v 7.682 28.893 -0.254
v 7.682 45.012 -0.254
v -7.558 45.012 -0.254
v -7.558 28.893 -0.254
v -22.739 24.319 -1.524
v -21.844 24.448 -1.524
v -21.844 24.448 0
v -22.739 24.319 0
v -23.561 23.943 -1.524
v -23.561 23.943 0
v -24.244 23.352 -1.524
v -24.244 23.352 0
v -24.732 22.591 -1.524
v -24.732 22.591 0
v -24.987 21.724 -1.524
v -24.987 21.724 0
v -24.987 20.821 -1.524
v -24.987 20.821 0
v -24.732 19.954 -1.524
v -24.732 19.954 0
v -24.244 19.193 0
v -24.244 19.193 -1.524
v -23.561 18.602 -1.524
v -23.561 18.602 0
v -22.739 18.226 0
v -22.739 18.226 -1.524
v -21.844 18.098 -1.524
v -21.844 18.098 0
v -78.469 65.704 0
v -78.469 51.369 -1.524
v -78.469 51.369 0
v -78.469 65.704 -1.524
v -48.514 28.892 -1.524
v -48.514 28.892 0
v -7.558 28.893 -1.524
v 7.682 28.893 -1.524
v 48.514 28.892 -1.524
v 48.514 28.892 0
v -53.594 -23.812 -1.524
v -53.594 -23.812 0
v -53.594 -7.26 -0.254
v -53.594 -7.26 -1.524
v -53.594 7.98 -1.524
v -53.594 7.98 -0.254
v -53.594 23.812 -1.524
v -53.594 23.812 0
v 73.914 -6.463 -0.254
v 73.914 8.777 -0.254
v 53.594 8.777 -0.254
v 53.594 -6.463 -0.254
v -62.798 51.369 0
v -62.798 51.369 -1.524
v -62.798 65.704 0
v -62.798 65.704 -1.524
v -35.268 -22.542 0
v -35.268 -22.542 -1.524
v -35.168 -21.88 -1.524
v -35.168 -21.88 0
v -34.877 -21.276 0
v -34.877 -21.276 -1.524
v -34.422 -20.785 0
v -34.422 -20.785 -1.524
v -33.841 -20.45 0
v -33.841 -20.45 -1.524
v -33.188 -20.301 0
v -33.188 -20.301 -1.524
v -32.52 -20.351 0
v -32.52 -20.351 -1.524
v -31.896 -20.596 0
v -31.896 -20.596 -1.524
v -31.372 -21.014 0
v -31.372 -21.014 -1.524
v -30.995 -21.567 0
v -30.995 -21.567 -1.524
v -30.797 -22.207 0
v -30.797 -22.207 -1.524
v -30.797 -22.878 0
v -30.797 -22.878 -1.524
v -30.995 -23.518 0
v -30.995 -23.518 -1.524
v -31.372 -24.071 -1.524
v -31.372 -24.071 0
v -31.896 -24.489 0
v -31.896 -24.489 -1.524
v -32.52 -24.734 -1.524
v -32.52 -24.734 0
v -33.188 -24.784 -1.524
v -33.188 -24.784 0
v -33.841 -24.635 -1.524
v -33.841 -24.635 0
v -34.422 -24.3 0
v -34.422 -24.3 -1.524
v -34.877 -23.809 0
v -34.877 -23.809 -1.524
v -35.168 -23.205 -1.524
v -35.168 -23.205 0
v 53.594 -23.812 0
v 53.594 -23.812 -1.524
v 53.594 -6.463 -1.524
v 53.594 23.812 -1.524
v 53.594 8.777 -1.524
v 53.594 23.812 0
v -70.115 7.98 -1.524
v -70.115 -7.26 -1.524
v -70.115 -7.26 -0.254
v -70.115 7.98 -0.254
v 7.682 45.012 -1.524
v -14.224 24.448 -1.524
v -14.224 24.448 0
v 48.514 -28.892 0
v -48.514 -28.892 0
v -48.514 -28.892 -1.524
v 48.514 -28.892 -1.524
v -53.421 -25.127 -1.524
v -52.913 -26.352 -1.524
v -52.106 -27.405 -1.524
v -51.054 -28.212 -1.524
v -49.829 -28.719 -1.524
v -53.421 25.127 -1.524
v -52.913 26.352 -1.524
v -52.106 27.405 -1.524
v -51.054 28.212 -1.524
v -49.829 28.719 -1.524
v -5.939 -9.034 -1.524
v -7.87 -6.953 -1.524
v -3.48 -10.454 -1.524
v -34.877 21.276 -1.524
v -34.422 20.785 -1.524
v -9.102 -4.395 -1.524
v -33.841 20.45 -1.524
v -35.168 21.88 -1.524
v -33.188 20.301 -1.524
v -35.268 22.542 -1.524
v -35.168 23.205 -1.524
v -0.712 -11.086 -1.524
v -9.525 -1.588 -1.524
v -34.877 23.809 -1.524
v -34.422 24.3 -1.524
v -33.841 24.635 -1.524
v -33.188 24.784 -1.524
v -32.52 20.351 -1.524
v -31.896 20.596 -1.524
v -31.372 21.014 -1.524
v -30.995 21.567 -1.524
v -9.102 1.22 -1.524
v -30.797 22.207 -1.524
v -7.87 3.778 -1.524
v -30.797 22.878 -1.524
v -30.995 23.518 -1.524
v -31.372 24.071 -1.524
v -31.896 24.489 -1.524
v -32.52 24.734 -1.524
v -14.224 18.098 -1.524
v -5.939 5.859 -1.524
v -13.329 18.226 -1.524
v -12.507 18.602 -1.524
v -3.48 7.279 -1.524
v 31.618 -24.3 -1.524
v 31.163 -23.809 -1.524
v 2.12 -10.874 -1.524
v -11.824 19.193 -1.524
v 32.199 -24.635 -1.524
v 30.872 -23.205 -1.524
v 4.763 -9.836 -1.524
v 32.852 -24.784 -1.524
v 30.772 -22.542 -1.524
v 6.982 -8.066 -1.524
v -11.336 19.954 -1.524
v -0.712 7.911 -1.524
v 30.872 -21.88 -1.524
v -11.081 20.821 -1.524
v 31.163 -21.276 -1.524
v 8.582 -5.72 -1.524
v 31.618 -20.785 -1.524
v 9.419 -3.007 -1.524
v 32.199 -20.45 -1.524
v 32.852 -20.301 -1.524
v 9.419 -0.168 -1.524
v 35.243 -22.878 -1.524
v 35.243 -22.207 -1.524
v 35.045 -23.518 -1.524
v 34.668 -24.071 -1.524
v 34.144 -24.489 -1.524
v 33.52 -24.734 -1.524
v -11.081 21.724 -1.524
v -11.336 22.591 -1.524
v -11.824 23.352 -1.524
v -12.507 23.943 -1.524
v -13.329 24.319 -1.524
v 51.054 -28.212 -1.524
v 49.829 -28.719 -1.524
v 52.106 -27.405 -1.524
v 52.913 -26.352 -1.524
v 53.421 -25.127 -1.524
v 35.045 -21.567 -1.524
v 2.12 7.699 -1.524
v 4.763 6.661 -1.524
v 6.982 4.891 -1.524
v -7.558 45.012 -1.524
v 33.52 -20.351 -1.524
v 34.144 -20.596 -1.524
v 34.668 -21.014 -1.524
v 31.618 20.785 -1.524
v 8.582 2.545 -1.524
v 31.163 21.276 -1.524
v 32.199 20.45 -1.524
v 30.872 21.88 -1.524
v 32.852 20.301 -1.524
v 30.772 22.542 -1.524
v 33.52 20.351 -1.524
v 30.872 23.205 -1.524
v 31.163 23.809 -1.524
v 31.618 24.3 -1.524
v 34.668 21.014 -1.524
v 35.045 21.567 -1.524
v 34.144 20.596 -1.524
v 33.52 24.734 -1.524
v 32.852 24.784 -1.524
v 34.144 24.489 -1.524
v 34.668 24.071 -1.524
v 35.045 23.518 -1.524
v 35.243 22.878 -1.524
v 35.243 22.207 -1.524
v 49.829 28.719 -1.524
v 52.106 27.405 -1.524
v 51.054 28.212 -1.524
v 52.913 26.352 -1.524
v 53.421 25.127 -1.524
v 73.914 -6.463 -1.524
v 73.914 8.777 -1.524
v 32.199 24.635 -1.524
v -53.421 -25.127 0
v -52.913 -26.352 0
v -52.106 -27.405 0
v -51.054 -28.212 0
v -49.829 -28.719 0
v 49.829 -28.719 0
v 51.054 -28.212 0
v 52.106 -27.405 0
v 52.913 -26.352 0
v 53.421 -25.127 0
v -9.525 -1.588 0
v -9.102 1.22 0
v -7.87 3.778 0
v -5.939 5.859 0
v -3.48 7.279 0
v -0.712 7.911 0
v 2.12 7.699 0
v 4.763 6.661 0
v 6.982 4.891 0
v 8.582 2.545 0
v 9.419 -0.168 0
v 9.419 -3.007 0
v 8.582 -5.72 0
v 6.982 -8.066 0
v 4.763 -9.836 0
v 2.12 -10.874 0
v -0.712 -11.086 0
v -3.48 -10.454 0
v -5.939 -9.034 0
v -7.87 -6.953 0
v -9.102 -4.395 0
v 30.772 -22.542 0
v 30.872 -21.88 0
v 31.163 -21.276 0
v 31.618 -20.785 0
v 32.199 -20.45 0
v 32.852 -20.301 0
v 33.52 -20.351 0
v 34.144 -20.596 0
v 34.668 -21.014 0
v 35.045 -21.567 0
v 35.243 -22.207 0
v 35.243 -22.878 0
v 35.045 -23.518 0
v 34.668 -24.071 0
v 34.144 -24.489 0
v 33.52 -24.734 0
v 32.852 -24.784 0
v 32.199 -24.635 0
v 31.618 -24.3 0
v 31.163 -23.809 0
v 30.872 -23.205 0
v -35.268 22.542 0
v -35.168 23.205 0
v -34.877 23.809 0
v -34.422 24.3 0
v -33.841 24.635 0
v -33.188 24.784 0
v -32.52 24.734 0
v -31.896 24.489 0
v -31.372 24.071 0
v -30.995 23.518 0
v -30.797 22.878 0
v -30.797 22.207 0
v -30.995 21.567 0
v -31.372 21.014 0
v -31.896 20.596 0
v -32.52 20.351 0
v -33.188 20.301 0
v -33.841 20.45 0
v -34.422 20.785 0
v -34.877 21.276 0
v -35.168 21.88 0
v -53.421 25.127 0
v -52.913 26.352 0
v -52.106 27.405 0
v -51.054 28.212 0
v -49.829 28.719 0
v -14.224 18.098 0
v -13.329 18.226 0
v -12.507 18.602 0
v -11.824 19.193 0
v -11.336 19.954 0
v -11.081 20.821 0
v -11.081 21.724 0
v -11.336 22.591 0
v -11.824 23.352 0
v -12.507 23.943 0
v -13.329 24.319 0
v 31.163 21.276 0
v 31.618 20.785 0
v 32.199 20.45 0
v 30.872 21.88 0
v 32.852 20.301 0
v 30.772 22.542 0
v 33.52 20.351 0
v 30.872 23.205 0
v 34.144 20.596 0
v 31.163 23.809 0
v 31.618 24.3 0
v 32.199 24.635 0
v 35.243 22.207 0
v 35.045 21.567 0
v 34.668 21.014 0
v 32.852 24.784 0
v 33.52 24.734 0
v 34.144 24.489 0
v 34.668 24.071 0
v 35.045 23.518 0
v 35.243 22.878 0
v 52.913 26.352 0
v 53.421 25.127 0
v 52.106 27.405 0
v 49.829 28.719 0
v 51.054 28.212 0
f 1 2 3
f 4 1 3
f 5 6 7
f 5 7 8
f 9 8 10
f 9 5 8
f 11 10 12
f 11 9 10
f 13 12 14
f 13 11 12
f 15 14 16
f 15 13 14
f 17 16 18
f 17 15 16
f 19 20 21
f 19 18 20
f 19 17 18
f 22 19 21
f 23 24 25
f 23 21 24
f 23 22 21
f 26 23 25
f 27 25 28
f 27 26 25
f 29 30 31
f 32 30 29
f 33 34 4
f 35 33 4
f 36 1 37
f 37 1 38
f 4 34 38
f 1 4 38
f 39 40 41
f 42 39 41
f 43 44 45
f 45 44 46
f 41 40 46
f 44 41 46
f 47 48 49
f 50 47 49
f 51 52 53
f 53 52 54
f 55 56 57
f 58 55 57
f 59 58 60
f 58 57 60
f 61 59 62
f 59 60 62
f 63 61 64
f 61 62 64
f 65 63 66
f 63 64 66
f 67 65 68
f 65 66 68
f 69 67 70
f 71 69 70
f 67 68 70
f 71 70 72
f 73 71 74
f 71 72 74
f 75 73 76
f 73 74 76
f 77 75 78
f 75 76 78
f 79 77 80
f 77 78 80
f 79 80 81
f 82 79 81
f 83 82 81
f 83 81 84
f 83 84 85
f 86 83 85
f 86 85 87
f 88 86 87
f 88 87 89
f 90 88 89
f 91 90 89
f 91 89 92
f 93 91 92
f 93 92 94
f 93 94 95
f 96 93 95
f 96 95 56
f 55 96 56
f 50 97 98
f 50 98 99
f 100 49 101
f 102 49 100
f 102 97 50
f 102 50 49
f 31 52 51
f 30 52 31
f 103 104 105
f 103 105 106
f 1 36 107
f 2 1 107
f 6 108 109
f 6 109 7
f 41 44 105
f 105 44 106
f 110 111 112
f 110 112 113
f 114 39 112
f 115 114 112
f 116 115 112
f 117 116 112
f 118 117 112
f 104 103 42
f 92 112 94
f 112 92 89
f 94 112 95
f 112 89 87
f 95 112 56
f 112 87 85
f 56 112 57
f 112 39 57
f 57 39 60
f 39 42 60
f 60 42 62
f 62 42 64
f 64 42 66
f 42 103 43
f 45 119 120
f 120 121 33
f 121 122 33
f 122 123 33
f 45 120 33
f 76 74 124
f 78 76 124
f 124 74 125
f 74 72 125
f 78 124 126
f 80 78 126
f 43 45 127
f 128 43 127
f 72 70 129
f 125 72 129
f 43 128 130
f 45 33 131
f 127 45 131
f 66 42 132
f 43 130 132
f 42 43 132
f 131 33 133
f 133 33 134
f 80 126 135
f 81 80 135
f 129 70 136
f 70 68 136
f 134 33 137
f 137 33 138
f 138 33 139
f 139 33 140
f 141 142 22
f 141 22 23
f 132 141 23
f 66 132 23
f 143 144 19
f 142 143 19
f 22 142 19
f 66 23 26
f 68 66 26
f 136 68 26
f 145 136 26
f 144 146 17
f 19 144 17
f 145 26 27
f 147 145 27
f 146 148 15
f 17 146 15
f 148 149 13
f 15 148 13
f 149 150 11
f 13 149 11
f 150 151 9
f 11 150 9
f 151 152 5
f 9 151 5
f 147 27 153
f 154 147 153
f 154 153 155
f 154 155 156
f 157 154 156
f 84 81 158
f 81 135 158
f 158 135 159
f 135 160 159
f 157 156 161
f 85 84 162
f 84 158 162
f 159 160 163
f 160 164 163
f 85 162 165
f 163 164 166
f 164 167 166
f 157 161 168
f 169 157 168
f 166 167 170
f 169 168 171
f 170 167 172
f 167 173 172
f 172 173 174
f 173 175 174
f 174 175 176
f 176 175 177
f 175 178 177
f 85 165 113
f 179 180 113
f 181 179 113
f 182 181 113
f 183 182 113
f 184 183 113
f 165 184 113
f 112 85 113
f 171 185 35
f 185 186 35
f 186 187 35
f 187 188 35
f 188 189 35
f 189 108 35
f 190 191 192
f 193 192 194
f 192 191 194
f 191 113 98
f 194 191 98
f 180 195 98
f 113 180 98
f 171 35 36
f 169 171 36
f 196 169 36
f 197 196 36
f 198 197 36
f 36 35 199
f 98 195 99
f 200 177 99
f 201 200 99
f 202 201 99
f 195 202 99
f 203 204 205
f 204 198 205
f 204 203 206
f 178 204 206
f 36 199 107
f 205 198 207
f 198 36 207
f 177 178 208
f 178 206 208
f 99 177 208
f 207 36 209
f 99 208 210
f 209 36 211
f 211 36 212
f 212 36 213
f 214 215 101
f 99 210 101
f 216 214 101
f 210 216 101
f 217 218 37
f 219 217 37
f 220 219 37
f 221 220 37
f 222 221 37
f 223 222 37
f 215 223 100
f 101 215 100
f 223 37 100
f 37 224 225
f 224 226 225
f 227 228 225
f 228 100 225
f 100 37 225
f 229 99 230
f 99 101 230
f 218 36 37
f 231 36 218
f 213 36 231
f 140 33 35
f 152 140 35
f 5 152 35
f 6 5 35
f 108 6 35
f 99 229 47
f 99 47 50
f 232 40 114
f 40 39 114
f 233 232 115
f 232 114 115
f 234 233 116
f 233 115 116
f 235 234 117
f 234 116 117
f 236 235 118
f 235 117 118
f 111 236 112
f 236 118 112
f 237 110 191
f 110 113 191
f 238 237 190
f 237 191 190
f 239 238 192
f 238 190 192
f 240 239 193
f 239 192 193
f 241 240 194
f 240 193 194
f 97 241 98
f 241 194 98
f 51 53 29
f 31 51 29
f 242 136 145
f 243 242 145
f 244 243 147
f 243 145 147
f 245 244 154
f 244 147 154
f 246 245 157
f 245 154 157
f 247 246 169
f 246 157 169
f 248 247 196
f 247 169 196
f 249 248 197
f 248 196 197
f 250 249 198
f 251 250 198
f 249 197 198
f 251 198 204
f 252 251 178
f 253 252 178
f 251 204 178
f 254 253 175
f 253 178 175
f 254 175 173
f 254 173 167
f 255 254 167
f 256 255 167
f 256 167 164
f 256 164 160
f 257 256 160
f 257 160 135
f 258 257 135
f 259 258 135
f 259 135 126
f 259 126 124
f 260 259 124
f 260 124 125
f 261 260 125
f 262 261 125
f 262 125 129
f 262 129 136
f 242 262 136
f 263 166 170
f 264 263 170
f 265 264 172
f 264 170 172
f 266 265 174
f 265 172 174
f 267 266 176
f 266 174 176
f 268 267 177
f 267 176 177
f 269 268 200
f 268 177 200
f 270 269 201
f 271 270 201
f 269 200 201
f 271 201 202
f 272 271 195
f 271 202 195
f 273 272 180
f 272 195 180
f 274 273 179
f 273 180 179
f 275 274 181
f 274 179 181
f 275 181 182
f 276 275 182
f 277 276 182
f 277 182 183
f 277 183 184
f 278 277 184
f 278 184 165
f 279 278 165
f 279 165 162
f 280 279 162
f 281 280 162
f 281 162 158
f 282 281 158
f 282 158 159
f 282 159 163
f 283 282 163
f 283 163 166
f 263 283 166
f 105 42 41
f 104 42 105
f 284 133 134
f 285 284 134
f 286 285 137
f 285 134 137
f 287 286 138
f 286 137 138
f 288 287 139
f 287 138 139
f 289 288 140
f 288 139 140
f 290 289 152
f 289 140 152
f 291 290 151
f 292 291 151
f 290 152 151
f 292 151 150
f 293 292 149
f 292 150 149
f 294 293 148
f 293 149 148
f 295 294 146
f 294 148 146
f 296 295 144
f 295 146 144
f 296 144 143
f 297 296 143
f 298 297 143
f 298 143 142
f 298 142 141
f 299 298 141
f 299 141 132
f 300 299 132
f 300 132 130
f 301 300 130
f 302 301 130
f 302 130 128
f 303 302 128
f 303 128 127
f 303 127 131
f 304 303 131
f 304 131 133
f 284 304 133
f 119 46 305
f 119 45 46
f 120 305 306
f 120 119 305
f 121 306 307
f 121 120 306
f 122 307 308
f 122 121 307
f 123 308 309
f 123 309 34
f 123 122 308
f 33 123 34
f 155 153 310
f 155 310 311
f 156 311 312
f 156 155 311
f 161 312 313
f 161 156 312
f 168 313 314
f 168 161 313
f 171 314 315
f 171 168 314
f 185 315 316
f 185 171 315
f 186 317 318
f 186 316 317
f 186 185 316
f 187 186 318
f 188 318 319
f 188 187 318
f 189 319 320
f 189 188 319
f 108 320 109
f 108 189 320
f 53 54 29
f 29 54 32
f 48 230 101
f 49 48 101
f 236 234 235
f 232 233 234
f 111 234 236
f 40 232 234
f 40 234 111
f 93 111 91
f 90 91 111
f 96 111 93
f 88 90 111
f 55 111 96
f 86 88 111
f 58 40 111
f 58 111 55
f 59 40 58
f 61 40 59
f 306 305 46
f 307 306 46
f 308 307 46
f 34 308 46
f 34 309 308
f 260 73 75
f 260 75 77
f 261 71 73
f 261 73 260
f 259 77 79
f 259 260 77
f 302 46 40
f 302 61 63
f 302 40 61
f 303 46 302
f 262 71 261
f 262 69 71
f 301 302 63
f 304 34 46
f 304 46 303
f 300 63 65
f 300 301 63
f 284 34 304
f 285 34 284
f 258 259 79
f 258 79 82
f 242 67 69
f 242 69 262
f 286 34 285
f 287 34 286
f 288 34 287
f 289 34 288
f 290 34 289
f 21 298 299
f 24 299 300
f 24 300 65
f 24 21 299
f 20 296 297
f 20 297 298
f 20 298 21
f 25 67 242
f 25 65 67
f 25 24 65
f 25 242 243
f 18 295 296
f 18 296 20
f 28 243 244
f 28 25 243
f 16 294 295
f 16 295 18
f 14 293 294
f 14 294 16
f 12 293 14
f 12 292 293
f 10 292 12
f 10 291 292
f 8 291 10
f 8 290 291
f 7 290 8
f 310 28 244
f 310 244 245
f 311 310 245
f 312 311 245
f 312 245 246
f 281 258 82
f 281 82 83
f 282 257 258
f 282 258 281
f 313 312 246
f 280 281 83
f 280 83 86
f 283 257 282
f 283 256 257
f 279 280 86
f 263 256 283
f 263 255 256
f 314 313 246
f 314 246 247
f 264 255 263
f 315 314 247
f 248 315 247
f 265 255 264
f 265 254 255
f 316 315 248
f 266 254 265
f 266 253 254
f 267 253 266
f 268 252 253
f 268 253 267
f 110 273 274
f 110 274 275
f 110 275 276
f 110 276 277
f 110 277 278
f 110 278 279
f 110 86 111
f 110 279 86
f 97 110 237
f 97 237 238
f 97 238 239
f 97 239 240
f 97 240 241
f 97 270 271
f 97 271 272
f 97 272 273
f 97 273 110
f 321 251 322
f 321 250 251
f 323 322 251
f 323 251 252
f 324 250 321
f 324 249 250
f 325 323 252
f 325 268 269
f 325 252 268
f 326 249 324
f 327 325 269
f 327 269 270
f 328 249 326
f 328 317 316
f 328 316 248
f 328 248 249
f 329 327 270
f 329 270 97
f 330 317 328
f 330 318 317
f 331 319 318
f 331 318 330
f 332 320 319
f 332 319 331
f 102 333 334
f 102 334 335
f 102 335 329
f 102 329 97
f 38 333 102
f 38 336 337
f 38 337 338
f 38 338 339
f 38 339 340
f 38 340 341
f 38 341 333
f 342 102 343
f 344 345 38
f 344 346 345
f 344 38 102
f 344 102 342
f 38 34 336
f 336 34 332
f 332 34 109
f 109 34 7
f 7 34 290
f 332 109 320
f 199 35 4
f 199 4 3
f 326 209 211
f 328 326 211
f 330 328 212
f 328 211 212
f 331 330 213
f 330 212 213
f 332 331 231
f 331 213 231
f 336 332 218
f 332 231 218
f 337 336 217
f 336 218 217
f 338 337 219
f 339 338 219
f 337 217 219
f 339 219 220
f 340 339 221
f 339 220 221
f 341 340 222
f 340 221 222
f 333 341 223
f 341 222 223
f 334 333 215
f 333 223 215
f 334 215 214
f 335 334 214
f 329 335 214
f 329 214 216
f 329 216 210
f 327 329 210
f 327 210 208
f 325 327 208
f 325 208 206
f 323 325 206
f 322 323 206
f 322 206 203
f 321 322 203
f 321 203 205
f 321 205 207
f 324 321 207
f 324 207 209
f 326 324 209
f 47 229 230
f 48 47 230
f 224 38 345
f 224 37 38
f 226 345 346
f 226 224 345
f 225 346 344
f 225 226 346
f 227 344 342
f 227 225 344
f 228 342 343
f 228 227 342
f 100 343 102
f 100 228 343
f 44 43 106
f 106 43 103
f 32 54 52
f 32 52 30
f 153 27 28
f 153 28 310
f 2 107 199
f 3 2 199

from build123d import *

# Parameters (mm, degrees)
SKETCH1_W                   = 107.188
SKETCH1_H                   = 57.785
BASE_FLANGE1_DEPTH          = 1.524
F_16_0_177_DIAMETER_HOLE1_D = 4.4958
SKETCH9_R                   = 9.525
CUT_EXTRUDE1_DEPTH          = 61.904974906
FILLET1_R                   = 5.08
SKETCH21_W                  = 15.670888323
SKETCH21_H                  = 14.335334597
BOSS_EXTRUDE2_DEPTH         = 1.524
SKETCH26_W                  = 16.520642104
SKETCH26_H                  = 15.24
SKETCH26_W_2                = 20.320035359
SKETCH26_W_3                = 15.24
SKETCH26_H_2                = 16.119874992
BOSS_EXTRUDE3_DEPTH         = 1.27


# Sheet-metal steps are written as plain solids
with BuildPart() as part:
    # Sketch1 → Base-Flange1 (new body)
    with BuildSketch(Plane.XY):
        Rectangle(SKETCH1_W, SKETCH1_H)
    extrude(amount=-BASE_FLANGE1_DEPTH)

    # #16 (0.177) Diameter Hole1 (through all)
    with Locations(Plane.XY):
        with Locations((-33.02, 22.5425), (33.02, 22.5425), (33.02, -22.5425), (-33.02, -22.5425)):
            Hole(F_16_0_177_DIAMETER_HOLE1_D / 2)

    # Sketch9 → Cut-Extrude1 (cut, through all)
    with BuildSketch(Plane(origin=(0, 0, -1.524), x_dir=(-1, 0, 0), z_dir=(0, 0, -1))):
        with Locations((0, -1.5875)):
            Circle(SKETCH9_R)
        with BuildLine():
            Line((14.224, 24.4475), (21.844, 24.4475))
            ThreePointArc((21.844, 24.4475), (25.019, 21.2725), (21.844, 18.0975))
            Line((21.844, 18.0975), (14.224, 18.0975))
            ThreePointArc((14.224, 18.0975), (11.049, 21.2725), (14.224, 24.4475))
        make_face()
    extrude(amount=-CUT_EXTRUDE1_DEPTH, mode=Mode.SUBTRACT)

    # Fillet1
    fillet1_edges = [part.edges().sort_by_distance(p)[0] for p in [
        (-53.594, 28.8925, -0.762),
        (53.594, 28.8925, -0.762),
        (53.594, -28.8925, -0.762),
        (-53.594, -28.8925, -0.762),
    ]]
    fillet(fillet1_edges, radius=FILLET1_R)

    # Sketch26 → Boss-Extrude3 (add)
    with BuildSketch(Plane(origin=(0, 0, -1.524), x_dir=(-1, 0, 0), z_dir=(0, 0, -1))):
        with Locations((61.854321052, 0.35968498)):
            Rectangle(SKETCH26_W, SKETCH26_H)
        with Locations((-63.75401768, 1.15731215)):
            Rectangle(SKETCH26_W_2, SKETCH26_H)
        with Locations((-0.062117332, 36.952437496)):
            Rectangle(SKETCH26_W_3, SKETCH26_H_2)
    extrude(amount=-BOSS_EXTRUDE3_DEPTH)


with BuildPart() as body_2:
    # Sketch21 → Boss-Extrude2 (new body)
    with BuildSketch(Plane(origin=(0, 0, -1.524), x_dir=(-1, 0, 0), z_dir=(0, 0, -1))):
        with Locations((70.633718088, 58.536455808)):
            Rectangle(SKETCH21_W, SKETCH21_H)
    extrude(amount=-BOSS_EXTRUDE2_DEPTH)


solid = Compound([part.part, body_2.part])
